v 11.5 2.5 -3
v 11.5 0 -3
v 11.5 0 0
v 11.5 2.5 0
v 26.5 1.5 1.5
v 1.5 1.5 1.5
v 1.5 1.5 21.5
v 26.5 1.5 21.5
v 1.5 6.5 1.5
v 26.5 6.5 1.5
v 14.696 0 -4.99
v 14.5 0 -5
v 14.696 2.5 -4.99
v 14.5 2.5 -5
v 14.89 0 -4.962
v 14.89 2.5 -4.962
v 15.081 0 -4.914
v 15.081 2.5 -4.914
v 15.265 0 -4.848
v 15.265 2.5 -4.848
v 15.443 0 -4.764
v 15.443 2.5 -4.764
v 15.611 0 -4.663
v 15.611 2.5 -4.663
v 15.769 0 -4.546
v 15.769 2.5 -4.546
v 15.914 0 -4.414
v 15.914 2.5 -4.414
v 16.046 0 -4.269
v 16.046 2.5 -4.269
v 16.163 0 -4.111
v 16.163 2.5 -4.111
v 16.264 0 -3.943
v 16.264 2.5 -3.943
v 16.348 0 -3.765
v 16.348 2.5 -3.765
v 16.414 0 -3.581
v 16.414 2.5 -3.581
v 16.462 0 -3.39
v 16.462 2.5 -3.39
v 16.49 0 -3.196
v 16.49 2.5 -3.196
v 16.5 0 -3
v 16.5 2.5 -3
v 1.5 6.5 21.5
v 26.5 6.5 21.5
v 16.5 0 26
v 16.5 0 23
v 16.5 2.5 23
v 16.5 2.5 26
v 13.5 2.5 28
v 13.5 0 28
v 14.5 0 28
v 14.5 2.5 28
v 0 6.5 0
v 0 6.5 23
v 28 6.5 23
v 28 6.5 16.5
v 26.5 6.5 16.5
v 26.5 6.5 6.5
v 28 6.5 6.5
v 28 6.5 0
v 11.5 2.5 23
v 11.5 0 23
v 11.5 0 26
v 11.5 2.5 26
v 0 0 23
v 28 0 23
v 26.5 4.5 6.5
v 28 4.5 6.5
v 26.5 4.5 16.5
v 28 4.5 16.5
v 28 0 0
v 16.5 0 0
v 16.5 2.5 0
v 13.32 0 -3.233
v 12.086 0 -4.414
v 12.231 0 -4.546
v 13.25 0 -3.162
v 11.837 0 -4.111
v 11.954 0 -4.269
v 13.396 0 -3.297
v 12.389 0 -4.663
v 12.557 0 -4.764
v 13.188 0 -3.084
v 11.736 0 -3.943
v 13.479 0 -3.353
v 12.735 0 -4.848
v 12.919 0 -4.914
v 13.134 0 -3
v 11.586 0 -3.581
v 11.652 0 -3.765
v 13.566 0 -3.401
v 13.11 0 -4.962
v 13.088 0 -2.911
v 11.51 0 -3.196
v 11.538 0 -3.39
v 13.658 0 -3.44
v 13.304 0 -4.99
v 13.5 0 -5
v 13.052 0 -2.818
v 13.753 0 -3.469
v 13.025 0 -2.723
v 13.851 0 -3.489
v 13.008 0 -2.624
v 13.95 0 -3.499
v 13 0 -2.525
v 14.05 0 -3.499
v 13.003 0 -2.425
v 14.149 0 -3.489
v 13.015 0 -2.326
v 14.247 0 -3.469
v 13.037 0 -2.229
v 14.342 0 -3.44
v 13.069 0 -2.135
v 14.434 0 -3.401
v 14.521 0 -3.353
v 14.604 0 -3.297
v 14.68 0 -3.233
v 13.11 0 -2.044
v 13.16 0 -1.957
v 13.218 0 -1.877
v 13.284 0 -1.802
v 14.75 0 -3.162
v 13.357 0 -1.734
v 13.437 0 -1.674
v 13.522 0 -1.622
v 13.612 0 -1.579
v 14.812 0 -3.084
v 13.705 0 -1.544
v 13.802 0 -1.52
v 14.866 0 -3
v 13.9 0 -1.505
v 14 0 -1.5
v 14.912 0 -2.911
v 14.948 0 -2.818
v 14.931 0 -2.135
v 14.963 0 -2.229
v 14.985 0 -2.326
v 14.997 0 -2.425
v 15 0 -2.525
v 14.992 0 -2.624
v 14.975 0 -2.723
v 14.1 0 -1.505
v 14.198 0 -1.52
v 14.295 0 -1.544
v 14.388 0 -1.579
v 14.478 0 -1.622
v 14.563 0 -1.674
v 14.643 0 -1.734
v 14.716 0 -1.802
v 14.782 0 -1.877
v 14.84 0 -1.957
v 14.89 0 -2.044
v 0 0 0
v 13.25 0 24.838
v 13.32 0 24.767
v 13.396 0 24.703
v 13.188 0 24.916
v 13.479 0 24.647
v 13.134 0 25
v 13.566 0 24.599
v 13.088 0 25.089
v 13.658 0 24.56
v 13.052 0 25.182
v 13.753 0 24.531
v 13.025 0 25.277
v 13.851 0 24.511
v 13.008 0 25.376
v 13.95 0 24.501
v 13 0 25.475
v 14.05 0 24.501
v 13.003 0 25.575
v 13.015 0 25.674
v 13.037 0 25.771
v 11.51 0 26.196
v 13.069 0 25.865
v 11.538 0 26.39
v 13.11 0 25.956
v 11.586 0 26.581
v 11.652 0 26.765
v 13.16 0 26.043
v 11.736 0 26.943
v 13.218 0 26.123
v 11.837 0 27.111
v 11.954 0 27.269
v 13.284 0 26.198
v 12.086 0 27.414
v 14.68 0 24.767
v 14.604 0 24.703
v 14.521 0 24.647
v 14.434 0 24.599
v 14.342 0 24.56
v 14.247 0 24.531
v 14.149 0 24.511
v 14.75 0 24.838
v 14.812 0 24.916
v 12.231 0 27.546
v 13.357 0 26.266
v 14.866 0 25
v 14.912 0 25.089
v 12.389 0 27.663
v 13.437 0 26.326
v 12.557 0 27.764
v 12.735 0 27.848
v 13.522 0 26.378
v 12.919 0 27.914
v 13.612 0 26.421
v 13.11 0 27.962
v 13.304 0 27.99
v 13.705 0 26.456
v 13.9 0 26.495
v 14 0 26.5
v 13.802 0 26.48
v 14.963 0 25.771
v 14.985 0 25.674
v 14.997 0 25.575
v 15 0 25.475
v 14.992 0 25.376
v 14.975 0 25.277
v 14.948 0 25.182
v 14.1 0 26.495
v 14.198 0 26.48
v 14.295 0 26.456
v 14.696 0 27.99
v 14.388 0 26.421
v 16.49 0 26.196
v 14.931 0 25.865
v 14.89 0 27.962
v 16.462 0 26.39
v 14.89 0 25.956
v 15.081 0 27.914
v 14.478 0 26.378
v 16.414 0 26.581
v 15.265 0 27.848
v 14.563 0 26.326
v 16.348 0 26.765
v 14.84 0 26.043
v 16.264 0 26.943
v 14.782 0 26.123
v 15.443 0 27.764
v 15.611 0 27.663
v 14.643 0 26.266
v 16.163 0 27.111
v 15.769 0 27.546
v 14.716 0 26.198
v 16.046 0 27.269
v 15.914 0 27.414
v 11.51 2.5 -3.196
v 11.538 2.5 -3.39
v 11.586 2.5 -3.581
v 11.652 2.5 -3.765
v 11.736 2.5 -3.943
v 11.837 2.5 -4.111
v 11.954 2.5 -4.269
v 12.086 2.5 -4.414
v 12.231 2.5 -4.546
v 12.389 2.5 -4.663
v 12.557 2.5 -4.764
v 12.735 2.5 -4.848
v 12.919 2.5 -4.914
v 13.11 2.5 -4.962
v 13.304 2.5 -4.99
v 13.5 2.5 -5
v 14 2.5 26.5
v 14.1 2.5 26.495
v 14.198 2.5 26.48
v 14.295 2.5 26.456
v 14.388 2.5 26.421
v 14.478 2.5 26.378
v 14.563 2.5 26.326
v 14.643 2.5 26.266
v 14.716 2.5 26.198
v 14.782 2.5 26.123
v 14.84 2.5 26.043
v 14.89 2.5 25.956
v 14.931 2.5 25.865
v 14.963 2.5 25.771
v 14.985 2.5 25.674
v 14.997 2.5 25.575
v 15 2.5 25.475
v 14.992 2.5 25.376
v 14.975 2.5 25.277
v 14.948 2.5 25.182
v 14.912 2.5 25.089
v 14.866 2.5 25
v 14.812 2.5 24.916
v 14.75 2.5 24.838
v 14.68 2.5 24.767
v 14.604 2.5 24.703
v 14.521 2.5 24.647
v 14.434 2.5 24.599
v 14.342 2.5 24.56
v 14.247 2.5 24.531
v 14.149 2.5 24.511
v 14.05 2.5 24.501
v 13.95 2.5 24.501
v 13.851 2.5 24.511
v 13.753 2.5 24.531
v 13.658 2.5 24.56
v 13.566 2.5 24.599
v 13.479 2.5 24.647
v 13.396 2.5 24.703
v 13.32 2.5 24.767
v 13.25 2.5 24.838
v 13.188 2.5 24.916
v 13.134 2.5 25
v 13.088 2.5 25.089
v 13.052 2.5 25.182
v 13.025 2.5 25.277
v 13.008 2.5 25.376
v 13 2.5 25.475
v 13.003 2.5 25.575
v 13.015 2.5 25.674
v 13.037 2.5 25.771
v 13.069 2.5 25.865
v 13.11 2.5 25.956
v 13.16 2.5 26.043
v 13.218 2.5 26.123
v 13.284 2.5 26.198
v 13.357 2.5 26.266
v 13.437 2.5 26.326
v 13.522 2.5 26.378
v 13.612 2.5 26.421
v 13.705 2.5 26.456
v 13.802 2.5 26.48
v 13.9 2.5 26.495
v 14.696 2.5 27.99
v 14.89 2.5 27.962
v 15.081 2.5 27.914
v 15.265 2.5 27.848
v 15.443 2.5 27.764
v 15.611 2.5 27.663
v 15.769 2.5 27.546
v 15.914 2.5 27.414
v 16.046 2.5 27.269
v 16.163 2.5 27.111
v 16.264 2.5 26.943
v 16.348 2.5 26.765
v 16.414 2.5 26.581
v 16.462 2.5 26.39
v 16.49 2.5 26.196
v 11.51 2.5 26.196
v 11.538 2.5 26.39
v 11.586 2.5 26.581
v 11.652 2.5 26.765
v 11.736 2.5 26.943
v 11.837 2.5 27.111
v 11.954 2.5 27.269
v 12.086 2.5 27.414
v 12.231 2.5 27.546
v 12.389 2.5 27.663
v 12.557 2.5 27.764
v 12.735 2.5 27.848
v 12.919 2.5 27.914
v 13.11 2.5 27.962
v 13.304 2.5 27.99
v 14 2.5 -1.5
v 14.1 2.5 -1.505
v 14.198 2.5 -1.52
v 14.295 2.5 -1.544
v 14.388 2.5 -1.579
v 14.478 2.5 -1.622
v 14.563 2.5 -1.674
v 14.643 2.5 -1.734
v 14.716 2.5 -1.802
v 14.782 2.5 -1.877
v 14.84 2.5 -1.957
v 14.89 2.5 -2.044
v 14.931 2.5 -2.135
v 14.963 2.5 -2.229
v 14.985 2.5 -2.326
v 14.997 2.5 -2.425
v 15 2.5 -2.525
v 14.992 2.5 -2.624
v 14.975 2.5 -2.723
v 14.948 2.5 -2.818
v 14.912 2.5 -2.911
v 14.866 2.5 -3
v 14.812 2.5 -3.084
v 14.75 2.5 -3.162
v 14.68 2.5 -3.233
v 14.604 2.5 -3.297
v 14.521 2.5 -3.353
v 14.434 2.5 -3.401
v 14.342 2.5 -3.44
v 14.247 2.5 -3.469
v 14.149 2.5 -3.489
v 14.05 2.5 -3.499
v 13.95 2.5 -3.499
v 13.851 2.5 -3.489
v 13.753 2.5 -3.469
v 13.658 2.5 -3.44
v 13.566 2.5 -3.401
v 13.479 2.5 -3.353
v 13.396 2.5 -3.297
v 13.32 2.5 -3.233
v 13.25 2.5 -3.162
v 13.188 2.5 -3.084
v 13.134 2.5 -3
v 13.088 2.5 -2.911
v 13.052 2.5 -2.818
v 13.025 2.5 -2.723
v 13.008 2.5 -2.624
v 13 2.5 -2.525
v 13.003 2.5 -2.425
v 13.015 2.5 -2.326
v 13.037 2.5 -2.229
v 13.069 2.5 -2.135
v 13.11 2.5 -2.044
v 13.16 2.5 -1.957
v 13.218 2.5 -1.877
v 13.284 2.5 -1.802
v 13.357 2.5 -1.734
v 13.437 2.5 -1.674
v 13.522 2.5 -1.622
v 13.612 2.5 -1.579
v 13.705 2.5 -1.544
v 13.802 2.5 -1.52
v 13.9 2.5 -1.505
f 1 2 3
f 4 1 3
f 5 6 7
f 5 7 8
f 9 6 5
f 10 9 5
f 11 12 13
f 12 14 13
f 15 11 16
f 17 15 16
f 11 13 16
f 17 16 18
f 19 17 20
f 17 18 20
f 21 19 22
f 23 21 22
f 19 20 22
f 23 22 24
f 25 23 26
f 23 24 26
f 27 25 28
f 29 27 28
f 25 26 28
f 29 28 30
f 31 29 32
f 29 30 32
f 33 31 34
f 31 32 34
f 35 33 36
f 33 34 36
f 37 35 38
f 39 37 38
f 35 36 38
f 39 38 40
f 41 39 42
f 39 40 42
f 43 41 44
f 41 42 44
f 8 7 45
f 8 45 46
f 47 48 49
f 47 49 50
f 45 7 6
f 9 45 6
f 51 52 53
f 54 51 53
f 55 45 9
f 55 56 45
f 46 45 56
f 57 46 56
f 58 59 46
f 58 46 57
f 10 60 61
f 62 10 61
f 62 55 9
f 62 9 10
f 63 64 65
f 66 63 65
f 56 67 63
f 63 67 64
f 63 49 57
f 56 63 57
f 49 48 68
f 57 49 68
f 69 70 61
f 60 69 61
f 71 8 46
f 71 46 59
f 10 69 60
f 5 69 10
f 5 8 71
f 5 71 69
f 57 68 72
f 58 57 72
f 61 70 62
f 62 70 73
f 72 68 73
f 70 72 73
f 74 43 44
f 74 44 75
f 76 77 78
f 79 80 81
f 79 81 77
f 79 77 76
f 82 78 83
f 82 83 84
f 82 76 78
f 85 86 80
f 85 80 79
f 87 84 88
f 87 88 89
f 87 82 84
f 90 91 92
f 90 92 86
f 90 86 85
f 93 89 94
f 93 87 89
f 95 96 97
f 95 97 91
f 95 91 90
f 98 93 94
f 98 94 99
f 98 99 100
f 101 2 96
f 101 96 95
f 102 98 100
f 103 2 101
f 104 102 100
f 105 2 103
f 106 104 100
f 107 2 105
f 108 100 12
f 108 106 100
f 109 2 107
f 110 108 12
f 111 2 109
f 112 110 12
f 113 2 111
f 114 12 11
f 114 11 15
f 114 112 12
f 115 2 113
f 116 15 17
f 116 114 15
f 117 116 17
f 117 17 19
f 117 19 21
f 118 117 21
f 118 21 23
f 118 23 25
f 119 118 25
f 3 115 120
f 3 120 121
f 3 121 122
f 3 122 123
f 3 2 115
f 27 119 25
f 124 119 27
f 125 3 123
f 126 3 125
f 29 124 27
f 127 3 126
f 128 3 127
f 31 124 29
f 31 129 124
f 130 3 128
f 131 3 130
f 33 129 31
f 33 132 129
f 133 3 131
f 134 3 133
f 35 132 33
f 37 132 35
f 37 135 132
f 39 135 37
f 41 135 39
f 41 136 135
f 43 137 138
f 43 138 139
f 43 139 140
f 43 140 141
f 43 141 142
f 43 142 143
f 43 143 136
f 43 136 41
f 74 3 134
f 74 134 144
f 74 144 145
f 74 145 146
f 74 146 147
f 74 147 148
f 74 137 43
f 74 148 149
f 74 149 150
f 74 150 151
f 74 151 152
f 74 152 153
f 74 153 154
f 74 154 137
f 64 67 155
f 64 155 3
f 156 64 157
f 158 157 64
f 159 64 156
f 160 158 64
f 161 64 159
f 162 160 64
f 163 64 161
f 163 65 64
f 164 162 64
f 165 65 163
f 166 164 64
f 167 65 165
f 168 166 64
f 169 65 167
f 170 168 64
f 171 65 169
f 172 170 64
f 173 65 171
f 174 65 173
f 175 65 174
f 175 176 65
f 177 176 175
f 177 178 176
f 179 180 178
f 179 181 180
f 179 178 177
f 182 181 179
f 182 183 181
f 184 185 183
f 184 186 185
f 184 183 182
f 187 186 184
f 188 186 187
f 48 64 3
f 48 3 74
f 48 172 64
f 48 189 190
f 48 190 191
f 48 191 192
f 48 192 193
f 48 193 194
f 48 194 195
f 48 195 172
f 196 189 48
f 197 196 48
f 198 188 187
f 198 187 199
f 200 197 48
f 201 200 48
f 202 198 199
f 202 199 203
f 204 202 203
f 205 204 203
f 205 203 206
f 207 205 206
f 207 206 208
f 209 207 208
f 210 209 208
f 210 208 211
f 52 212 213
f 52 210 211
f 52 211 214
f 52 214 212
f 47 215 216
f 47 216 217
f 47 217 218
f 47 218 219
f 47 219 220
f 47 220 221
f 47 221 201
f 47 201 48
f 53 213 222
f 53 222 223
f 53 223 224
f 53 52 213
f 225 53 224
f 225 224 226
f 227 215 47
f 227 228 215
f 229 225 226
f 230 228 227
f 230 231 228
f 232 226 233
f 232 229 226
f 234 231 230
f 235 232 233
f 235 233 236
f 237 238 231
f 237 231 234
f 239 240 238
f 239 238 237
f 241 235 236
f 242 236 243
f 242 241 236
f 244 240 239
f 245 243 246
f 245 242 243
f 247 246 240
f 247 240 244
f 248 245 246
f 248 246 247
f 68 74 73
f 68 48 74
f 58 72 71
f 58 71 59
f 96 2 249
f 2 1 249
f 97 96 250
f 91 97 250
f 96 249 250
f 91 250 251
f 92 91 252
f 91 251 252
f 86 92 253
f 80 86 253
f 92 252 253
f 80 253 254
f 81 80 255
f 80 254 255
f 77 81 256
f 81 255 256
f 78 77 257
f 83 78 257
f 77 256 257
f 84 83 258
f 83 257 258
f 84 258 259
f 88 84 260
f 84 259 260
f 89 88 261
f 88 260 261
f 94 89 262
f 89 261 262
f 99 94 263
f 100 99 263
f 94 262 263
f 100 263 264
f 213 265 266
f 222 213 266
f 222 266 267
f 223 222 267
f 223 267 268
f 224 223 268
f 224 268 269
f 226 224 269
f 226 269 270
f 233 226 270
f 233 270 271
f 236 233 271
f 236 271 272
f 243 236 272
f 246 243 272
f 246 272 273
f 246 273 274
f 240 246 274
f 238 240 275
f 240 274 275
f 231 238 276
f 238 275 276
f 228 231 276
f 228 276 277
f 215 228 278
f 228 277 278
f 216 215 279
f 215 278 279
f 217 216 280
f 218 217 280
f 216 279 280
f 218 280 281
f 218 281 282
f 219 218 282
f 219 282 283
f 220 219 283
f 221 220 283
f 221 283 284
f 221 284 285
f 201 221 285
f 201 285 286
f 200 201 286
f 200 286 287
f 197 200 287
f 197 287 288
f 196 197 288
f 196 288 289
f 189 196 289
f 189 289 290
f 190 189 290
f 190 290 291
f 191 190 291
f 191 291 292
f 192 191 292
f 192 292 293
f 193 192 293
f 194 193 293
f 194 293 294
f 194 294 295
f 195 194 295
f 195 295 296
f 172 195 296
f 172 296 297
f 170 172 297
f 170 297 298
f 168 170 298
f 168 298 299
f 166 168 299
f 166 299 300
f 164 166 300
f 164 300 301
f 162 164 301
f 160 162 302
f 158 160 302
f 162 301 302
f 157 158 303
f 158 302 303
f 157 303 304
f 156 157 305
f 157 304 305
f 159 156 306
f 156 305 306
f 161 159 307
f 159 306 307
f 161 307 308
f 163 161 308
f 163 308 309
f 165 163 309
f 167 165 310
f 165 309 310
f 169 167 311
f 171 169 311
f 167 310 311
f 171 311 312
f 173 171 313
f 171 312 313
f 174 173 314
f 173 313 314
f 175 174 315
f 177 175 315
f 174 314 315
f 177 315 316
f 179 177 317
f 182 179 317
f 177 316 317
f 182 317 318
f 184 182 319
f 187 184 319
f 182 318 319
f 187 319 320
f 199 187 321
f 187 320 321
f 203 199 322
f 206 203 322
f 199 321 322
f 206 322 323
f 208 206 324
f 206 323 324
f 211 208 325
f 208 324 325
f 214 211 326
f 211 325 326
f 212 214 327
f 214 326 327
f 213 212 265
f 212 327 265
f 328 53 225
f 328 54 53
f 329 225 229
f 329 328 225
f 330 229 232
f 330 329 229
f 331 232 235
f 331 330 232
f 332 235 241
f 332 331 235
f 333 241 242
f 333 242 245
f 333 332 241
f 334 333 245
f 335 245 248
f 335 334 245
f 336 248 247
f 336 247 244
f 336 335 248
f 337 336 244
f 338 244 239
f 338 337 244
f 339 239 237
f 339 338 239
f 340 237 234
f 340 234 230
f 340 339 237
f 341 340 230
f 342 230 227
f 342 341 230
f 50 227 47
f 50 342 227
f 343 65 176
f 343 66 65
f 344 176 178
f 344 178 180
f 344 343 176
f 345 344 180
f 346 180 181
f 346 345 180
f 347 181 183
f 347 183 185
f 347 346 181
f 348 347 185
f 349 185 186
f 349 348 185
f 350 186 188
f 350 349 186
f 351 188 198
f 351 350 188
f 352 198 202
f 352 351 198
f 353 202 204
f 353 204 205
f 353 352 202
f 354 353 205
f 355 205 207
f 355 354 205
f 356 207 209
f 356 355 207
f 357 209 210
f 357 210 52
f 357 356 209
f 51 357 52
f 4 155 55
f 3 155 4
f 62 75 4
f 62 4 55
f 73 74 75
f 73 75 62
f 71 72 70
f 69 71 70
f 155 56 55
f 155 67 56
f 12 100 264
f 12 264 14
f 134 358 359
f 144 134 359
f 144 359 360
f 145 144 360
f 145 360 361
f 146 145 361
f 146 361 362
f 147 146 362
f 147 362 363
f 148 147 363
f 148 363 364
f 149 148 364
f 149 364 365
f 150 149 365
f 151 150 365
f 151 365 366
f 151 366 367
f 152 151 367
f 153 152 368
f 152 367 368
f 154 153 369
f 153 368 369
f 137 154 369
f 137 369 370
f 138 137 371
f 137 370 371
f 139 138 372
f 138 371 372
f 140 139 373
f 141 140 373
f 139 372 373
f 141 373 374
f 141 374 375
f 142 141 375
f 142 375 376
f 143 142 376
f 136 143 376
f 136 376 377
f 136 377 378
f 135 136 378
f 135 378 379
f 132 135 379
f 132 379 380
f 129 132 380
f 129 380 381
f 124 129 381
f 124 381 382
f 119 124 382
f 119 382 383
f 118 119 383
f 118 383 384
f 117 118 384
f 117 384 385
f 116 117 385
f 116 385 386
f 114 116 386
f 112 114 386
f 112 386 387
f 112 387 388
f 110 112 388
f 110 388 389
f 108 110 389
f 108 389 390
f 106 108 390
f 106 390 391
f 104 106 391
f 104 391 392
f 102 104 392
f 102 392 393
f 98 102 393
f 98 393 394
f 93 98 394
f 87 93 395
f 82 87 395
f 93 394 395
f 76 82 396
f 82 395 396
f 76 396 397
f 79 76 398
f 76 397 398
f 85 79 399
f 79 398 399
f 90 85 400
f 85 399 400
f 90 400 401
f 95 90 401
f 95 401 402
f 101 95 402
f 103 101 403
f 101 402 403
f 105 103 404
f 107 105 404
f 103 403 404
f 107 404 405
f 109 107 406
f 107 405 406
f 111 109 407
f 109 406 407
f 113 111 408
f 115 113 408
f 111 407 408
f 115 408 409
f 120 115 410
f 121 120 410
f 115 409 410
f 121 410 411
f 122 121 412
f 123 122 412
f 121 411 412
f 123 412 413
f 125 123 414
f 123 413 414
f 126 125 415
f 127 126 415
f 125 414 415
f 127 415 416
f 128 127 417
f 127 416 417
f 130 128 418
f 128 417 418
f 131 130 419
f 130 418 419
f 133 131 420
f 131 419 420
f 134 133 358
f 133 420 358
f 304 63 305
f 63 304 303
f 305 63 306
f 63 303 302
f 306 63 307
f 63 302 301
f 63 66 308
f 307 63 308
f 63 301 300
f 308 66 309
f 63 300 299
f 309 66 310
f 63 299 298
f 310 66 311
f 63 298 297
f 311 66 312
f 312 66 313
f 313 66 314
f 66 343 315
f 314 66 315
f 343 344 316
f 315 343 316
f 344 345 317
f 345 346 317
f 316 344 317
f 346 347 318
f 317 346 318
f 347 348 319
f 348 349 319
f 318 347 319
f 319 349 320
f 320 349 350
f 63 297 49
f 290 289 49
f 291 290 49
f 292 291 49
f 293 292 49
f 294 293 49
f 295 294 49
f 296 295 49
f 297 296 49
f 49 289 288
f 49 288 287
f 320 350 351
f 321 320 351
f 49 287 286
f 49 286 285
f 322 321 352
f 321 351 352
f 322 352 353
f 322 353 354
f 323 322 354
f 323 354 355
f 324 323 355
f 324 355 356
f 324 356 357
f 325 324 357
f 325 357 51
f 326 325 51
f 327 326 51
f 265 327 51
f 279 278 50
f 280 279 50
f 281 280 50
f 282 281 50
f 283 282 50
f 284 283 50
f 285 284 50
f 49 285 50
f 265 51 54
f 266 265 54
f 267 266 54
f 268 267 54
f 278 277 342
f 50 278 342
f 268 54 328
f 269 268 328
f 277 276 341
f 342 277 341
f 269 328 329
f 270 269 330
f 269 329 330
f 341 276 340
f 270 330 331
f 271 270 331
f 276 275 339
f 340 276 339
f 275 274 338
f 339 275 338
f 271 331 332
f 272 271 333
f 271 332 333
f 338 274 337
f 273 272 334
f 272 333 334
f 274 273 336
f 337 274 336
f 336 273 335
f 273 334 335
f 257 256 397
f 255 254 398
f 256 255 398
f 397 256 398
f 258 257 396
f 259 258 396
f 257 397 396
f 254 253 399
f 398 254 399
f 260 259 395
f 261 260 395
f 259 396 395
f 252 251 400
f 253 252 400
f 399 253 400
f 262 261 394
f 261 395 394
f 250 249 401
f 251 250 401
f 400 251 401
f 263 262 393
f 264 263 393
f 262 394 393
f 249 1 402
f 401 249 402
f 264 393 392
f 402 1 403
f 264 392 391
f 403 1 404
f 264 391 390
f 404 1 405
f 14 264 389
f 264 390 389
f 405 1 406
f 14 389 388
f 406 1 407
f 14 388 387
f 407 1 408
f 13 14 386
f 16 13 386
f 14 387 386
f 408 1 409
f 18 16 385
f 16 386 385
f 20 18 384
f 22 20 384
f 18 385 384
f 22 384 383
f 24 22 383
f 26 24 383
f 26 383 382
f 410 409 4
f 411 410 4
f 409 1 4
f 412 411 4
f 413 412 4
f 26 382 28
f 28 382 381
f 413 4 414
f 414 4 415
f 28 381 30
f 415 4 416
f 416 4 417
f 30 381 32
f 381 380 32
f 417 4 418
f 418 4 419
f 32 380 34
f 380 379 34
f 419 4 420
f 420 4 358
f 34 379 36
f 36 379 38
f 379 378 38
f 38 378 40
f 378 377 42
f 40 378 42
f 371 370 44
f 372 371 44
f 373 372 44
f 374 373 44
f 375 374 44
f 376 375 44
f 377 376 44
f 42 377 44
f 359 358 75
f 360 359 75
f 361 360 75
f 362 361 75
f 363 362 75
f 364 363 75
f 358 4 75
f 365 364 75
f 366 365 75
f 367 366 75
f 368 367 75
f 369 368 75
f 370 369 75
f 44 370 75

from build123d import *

# Parameters (mm, degrees)
SKETCH_1_W          = 28
SKETCH_1_H          = 23
EXTRUDE_1_DEPTH     = 1.5
SKETCH_2_W          = 28
SKETCH_2_H          = 23
SKETCH_2_W_2        = 25
SKETCH_2_H_2        = 20
EXTRUDE_2_DEPTH     = 5
SKETCH_4_W          = 10
SKETCH_4_H          = 2
CUT_EXTRUDE_1_DEPTH = 2
SKETCH_5_W          = 5
SKETCH_5_H          = 33
EXTRUDE_3_DEPTH     = 2.5
SKETCH_6_W          = 5
SKETCH_6_H          = 20
CUT_EXTRUDE_2_DEPTH = 1
SKETCH_7_R          = 1
CUT_EXTRUDE_3_DEPTH = 40.799497484
FILLET_1_R          = 2


with BuildPart() as part:
    # 草图1 → 凸台-拉伸1 (new body)
    with BuildSketch(Plane(origin=(0, 0, 0), x_dir=(1, 0, 0), z_dir=(0, 1, 0))):
        with Locations((14, -11.5)):
            Rectangle(SKETCH_1_W, SKETCH_1_H)
    extrude(amount=EXTRUDE_1_DEPTH)

    # 草图2 → 凸台-拉伸2 (add)
    with BuildSketch(Plane(origin=(0, 1.5, 0), x_dir=(1, 0, 0), z_dir=(0, 1, 0))):
        with Locations((14, -11.5)):
            Rectangle(SKETCH_2_W, SKETCH_2_H)
        with Locations((14, -11.5)):
            Rectangle(SKETCH_2_W_2, SKETCH_2_H_2, mode=Mode.SUBTRACT)
    extrude(amount=EXTRUDE_2_DEPTH)

    # 草图4 → 切除-拉伸1 (cut)
    with BuildSketch(Plane(origin=(28, 0, 0), x_dir=(0, 0, -1), z_dir=(1, 0, 0))):
        with Locations((-11.5, 5.5)):
            Rectangle(SKETCH_4_W, SKETCH_4_H)
    extrude(amount=-CUT_EXTRUDE_1_DEPTH, mode=Mode.SUBTRACT)

    # 草图5 → 凸台-拉伸3 (add)
    with BuildSketch(Plane.XZ):
        with Locations((14, 11.5)):
            Rectangle(SKETCH_5_W, SKETCH_5_H)
    extrude(amount=-EXTRUDE_3_DEPTH)

    # 草图6 → 切除-拉伸2 (cut)
    with BuildSketch(Plane(origin=(0, 2.5, 0), x_dir=(1, 0, 0), z_dir=(0, 1, 0))):
        with Locations((14, -11.5)):
            Rectangle(SKETCH_6_W, SKETCH_6_H)
    extrude(amount=-CUT_EXTRUDE_2_DEPTH, mode=Mode.SUBTRACT)

    # 草图7 → 切除-拉伸3 (cut, through all)
    with BuildSketch(Plane(origin=(0, 2.5, 0), x_dir=(1, 0, 0), z_dir=(0, 1, 0))):
        with Locations(Location((14, 2.5, 0), (0, 0, 270))):
            Circle(SKETCH_7_R)
        with Locations(Location((14, -25.5, 0), (0, 0, 270))):
            Circle(SKETCH_7_R)
    extrude(amount=-CUT_EXTRUDE_3_DEPTH, mode=Mode.SUBTRACT)

    # 圆角1
    fillet_1_edges = [part.edges().sort_by_distance(p)[0] for p in [
        (11.5, 1.25, -5),
        (16.5, 1.25, 28),
        (11.5, 1.25, 28),
        (16.5, 1.25, -5),
    ]]
    fillet(fillet_1_edges, radius=FILLET_1_R)


solid = part.part
